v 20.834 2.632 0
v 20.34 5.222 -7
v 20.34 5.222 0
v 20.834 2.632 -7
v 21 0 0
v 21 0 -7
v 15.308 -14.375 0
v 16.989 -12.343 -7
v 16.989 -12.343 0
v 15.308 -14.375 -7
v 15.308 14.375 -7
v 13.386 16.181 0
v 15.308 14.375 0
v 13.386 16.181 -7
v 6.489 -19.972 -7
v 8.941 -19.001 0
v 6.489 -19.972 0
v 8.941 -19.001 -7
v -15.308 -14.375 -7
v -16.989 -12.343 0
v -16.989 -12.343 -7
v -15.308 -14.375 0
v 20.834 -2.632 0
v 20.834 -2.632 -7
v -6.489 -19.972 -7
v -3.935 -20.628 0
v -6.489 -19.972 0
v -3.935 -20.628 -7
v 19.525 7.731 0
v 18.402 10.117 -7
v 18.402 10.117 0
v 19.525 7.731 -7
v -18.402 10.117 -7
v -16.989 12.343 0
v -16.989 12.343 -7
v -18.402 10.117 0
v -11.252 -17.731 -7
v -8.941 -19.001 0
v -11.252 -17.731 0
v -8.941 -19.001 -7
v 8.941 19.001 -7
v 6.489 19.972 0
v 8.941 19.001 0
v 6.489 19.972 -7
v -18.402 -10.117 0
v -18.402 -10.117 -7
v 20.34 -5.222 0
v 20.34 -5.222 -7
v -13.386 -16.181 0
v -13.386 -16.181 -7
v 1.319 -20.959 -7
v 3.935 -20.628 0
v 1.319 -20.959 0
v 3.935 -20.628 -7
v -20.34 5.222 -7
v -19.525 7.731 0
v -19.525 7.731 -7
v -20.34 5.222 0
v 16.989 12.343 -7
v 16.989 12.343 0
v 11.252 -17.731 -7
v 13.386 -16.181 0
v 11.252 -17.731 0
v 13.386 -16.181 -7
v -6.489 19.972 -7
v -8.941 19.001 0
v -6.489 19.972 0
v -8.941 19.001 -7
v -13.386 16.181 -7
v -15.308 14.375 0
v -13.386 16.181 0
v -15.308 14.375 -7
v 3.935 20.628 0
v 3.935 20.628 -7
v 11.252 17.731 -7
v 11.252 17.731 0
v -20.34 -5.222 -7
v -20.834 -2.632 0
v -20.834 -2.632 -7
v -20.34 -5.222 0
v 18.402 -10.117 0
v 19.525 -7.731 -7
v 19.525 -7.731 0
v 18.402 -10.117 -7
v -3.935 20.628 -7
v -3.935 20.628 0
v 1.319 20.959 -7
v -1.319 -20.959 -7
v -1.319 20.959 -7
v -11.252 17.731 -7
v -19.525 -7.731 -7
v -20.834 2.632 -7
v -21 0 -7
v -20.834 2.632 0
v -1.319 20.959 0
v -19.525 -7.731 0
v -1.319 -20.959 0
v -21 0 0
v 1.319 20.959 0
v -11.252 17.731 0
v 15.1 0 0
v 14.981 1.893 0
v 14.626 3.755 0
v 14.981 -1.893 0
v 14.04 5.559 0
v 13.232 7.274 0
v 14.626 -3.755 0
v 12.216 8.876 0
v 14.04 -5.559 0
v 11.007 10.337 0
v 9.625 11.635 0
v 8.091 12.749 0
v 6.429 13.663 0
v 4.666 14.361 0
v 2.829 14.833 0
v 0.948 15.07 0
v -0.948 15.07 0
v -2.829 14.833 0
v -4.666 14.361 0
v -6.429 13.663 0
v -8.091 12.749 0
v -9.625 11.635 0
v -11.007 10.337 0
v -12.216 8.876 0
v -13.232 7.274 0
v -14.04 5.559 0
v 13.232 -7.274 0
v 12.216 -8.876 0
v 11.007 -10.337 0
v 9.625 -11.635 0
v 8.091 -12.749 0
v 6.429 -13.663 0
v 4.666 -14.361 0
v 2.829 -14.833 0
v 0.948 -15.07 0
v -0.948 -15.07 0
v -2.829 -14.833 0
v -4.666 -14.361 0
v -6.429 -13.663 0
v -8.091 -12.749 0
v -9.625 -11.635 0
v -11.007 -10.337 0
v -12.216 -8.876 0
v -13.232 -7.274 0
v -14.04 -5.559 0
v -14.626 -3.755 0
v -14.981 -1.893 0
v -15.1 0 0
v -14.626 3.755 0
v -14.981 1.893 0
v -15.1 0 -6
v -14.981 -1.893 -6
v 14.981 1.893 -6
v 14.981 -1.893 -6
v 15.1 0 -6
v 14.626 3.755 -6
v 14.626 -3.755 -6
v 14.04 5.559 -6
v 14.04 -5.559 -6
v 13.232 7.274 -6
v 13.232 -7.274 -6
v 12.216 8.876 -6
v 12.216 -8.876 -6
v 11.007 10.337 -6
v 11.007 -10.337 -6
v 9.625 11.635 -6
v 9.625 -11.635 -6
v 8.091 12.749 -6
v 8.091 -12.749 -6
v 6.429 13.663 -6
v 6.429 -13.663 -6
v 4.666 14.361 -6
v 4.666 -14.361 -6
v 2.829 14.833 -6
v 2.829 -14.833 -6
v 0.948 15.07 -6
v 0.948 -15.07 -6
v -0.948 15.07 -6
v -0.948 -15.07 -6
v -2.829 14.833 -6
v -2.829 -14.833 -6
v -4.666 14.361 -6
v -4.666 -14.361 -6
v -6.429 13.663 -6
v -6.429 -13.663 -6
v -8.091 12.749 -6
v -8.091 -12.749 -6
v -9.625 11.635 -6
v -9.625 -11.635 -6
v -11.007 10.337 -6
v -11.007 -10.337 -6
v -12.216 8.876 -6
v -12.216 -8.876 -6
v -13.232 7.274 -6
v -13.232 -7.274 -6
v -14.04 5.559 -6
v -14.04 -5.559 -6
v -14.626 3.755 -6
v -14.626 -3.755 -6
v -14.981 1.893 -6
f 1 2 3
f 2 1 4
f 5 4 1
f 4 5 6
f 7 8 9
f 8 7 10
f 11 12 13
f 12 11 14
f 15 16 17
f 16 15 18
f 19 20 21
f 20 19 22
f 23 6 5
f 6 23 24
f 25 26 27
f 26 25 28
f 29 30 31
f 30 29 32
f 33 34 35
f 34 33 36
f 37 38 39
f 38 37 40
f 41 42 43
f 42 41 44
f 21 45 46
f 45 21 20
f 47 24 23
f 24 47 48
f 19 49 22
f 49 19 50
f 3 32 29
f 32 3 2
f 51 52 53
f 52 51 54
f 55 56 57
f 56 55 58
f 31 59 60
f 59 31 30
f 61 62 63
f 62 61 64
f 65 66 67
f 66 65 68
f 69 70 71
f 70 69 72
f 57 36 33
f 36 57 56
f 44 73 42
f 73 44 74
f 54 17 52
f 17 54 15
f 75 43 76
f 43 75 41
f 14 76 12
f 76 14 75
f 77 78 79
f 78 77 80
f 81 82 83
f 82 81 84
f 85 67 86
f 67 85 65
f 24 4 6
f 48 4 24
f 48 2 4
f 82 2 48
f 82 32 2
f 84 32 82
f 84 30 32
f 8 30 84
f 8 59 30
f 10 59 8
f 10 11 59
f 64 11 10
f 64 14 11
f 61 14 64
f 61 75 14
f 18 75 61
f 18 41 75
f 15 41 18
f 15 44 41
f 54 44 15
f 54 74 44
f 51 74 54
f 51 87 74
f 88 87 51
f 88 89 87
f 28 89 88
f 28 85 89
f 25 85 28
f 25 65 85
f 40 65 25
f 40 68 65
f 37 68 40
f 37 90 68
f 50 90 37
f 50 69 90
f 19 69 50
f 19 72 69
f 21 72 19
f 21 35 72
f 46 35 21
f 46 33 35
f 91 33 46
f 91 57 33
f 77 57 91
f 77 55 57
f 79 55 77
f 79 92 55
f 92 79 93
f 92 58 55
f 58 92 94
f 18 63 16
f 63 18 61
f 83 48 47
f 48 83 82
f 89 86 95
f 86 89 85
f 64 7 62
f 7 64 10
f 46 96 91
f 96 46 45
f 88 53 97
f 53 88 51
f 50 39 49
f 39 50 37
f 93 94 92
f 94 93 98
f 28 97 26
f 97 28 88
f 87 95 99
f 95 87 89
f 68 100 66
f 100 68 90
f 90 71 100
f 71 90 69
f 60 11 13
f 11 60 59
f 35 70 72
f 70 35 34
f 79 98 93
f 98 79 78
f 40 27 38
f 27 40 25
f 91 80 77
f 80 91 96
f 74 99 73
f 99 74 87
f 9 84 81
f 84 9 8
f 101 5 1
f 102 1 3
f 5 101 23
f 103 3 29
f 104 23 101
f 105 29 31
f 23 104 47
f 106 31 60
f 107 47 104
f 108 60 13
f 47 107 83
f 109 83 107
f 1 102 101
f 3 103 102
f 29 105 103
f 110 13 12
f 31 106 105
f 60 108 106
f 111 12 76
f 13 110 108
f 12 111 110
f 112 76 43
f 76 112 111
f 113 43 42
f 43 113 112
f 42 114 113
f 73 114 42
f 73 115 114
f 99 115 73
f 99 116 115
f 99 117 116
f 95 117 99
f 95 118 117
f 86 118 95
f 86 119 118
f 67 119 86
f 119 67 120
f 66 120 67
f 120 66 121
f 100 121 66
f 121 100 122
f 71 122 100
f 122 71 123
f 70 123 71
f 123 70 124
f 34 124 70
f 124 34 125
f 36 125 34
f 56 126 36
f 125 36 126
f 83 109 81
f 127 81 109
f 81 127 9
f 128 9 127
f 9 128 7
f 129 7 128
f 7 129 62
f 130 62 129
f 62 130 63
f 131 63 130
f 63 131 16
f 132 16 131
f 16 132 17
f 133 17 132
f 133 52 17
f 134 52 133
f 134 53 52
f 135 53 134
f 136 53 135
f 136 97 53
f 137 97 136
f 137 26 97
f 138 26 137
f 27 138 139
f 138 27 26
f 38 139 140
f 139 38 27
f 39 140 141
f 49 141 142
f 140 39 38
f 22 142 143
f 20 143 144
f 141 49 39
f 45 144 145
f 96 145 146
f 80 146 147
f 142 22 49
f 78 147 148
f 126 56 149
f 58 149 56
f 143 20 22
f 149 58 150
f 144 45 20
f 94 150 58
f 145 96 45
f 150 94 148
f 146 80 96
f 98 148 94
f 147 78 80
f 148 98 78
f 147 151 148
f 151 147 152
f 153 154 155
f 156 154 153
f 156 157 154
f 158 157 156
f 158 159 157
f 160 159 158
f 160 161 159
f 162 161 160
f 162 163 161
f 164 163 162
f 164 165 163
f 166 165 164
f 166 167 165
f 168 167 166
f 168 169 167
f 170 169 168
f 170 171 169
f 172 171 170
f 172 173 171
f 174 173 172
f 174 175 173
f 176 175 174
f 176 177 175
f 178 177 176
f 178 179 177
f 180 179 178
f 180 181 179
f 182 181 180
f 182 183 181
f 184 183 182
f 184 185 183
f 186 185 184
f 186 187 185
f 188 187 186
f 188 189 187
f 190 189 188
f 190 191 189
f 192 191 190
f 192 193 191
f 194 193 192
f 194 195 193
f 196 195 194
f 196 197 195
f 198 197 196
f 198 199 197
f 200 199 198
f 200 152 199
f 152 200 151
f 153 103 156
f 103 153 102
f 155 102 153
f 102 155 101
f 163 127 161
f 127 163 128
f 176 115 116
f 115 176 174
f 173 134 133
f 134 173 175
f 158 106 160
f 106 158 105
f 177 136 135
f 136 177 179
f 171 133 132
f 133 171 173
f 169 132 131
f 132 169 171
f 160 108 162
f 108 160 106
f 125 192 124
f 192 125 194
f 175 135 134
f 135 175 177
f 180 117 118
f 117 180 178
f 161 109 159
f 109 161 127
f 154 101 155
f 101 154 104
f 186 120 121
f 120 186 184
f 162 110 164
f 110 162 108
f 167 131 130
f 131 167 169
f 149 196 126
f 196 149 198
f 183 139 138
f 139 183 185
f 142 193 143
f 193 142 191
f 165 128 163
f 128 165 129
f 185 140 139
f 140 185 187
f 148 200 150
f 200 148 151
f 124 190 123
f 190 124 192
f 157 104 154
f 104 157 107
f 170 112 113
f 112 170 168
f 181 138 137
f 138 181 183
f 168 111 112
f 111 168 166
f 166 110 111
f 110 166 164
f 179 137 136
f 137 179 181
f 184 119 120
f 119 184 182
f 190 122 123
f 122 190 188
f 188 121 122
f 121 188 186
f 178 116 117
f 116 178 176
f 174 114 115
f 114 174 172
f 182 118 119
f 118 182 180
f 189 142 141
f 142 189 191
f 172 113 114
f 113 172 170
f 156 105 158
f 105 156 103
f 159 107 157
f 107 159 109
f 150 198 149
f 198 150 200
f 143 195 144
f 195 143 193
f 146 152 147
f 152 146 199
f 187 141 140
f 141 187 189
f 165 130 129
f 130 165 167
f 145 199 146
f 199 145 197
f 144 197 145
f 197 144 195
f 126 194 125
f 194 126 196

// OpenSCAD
$fn = 50;


difference() {
	union() {
		translate(v = [0, 0, -7.0000000000]) {
			cylinder(h = 7, r = 21.0000000000);
		}
	}
	union() {
		#translate(v = [0, 0, -6.0000000000]) {
			cylinder(h = 6, r = 15.1000000000);
		}
	}
}
